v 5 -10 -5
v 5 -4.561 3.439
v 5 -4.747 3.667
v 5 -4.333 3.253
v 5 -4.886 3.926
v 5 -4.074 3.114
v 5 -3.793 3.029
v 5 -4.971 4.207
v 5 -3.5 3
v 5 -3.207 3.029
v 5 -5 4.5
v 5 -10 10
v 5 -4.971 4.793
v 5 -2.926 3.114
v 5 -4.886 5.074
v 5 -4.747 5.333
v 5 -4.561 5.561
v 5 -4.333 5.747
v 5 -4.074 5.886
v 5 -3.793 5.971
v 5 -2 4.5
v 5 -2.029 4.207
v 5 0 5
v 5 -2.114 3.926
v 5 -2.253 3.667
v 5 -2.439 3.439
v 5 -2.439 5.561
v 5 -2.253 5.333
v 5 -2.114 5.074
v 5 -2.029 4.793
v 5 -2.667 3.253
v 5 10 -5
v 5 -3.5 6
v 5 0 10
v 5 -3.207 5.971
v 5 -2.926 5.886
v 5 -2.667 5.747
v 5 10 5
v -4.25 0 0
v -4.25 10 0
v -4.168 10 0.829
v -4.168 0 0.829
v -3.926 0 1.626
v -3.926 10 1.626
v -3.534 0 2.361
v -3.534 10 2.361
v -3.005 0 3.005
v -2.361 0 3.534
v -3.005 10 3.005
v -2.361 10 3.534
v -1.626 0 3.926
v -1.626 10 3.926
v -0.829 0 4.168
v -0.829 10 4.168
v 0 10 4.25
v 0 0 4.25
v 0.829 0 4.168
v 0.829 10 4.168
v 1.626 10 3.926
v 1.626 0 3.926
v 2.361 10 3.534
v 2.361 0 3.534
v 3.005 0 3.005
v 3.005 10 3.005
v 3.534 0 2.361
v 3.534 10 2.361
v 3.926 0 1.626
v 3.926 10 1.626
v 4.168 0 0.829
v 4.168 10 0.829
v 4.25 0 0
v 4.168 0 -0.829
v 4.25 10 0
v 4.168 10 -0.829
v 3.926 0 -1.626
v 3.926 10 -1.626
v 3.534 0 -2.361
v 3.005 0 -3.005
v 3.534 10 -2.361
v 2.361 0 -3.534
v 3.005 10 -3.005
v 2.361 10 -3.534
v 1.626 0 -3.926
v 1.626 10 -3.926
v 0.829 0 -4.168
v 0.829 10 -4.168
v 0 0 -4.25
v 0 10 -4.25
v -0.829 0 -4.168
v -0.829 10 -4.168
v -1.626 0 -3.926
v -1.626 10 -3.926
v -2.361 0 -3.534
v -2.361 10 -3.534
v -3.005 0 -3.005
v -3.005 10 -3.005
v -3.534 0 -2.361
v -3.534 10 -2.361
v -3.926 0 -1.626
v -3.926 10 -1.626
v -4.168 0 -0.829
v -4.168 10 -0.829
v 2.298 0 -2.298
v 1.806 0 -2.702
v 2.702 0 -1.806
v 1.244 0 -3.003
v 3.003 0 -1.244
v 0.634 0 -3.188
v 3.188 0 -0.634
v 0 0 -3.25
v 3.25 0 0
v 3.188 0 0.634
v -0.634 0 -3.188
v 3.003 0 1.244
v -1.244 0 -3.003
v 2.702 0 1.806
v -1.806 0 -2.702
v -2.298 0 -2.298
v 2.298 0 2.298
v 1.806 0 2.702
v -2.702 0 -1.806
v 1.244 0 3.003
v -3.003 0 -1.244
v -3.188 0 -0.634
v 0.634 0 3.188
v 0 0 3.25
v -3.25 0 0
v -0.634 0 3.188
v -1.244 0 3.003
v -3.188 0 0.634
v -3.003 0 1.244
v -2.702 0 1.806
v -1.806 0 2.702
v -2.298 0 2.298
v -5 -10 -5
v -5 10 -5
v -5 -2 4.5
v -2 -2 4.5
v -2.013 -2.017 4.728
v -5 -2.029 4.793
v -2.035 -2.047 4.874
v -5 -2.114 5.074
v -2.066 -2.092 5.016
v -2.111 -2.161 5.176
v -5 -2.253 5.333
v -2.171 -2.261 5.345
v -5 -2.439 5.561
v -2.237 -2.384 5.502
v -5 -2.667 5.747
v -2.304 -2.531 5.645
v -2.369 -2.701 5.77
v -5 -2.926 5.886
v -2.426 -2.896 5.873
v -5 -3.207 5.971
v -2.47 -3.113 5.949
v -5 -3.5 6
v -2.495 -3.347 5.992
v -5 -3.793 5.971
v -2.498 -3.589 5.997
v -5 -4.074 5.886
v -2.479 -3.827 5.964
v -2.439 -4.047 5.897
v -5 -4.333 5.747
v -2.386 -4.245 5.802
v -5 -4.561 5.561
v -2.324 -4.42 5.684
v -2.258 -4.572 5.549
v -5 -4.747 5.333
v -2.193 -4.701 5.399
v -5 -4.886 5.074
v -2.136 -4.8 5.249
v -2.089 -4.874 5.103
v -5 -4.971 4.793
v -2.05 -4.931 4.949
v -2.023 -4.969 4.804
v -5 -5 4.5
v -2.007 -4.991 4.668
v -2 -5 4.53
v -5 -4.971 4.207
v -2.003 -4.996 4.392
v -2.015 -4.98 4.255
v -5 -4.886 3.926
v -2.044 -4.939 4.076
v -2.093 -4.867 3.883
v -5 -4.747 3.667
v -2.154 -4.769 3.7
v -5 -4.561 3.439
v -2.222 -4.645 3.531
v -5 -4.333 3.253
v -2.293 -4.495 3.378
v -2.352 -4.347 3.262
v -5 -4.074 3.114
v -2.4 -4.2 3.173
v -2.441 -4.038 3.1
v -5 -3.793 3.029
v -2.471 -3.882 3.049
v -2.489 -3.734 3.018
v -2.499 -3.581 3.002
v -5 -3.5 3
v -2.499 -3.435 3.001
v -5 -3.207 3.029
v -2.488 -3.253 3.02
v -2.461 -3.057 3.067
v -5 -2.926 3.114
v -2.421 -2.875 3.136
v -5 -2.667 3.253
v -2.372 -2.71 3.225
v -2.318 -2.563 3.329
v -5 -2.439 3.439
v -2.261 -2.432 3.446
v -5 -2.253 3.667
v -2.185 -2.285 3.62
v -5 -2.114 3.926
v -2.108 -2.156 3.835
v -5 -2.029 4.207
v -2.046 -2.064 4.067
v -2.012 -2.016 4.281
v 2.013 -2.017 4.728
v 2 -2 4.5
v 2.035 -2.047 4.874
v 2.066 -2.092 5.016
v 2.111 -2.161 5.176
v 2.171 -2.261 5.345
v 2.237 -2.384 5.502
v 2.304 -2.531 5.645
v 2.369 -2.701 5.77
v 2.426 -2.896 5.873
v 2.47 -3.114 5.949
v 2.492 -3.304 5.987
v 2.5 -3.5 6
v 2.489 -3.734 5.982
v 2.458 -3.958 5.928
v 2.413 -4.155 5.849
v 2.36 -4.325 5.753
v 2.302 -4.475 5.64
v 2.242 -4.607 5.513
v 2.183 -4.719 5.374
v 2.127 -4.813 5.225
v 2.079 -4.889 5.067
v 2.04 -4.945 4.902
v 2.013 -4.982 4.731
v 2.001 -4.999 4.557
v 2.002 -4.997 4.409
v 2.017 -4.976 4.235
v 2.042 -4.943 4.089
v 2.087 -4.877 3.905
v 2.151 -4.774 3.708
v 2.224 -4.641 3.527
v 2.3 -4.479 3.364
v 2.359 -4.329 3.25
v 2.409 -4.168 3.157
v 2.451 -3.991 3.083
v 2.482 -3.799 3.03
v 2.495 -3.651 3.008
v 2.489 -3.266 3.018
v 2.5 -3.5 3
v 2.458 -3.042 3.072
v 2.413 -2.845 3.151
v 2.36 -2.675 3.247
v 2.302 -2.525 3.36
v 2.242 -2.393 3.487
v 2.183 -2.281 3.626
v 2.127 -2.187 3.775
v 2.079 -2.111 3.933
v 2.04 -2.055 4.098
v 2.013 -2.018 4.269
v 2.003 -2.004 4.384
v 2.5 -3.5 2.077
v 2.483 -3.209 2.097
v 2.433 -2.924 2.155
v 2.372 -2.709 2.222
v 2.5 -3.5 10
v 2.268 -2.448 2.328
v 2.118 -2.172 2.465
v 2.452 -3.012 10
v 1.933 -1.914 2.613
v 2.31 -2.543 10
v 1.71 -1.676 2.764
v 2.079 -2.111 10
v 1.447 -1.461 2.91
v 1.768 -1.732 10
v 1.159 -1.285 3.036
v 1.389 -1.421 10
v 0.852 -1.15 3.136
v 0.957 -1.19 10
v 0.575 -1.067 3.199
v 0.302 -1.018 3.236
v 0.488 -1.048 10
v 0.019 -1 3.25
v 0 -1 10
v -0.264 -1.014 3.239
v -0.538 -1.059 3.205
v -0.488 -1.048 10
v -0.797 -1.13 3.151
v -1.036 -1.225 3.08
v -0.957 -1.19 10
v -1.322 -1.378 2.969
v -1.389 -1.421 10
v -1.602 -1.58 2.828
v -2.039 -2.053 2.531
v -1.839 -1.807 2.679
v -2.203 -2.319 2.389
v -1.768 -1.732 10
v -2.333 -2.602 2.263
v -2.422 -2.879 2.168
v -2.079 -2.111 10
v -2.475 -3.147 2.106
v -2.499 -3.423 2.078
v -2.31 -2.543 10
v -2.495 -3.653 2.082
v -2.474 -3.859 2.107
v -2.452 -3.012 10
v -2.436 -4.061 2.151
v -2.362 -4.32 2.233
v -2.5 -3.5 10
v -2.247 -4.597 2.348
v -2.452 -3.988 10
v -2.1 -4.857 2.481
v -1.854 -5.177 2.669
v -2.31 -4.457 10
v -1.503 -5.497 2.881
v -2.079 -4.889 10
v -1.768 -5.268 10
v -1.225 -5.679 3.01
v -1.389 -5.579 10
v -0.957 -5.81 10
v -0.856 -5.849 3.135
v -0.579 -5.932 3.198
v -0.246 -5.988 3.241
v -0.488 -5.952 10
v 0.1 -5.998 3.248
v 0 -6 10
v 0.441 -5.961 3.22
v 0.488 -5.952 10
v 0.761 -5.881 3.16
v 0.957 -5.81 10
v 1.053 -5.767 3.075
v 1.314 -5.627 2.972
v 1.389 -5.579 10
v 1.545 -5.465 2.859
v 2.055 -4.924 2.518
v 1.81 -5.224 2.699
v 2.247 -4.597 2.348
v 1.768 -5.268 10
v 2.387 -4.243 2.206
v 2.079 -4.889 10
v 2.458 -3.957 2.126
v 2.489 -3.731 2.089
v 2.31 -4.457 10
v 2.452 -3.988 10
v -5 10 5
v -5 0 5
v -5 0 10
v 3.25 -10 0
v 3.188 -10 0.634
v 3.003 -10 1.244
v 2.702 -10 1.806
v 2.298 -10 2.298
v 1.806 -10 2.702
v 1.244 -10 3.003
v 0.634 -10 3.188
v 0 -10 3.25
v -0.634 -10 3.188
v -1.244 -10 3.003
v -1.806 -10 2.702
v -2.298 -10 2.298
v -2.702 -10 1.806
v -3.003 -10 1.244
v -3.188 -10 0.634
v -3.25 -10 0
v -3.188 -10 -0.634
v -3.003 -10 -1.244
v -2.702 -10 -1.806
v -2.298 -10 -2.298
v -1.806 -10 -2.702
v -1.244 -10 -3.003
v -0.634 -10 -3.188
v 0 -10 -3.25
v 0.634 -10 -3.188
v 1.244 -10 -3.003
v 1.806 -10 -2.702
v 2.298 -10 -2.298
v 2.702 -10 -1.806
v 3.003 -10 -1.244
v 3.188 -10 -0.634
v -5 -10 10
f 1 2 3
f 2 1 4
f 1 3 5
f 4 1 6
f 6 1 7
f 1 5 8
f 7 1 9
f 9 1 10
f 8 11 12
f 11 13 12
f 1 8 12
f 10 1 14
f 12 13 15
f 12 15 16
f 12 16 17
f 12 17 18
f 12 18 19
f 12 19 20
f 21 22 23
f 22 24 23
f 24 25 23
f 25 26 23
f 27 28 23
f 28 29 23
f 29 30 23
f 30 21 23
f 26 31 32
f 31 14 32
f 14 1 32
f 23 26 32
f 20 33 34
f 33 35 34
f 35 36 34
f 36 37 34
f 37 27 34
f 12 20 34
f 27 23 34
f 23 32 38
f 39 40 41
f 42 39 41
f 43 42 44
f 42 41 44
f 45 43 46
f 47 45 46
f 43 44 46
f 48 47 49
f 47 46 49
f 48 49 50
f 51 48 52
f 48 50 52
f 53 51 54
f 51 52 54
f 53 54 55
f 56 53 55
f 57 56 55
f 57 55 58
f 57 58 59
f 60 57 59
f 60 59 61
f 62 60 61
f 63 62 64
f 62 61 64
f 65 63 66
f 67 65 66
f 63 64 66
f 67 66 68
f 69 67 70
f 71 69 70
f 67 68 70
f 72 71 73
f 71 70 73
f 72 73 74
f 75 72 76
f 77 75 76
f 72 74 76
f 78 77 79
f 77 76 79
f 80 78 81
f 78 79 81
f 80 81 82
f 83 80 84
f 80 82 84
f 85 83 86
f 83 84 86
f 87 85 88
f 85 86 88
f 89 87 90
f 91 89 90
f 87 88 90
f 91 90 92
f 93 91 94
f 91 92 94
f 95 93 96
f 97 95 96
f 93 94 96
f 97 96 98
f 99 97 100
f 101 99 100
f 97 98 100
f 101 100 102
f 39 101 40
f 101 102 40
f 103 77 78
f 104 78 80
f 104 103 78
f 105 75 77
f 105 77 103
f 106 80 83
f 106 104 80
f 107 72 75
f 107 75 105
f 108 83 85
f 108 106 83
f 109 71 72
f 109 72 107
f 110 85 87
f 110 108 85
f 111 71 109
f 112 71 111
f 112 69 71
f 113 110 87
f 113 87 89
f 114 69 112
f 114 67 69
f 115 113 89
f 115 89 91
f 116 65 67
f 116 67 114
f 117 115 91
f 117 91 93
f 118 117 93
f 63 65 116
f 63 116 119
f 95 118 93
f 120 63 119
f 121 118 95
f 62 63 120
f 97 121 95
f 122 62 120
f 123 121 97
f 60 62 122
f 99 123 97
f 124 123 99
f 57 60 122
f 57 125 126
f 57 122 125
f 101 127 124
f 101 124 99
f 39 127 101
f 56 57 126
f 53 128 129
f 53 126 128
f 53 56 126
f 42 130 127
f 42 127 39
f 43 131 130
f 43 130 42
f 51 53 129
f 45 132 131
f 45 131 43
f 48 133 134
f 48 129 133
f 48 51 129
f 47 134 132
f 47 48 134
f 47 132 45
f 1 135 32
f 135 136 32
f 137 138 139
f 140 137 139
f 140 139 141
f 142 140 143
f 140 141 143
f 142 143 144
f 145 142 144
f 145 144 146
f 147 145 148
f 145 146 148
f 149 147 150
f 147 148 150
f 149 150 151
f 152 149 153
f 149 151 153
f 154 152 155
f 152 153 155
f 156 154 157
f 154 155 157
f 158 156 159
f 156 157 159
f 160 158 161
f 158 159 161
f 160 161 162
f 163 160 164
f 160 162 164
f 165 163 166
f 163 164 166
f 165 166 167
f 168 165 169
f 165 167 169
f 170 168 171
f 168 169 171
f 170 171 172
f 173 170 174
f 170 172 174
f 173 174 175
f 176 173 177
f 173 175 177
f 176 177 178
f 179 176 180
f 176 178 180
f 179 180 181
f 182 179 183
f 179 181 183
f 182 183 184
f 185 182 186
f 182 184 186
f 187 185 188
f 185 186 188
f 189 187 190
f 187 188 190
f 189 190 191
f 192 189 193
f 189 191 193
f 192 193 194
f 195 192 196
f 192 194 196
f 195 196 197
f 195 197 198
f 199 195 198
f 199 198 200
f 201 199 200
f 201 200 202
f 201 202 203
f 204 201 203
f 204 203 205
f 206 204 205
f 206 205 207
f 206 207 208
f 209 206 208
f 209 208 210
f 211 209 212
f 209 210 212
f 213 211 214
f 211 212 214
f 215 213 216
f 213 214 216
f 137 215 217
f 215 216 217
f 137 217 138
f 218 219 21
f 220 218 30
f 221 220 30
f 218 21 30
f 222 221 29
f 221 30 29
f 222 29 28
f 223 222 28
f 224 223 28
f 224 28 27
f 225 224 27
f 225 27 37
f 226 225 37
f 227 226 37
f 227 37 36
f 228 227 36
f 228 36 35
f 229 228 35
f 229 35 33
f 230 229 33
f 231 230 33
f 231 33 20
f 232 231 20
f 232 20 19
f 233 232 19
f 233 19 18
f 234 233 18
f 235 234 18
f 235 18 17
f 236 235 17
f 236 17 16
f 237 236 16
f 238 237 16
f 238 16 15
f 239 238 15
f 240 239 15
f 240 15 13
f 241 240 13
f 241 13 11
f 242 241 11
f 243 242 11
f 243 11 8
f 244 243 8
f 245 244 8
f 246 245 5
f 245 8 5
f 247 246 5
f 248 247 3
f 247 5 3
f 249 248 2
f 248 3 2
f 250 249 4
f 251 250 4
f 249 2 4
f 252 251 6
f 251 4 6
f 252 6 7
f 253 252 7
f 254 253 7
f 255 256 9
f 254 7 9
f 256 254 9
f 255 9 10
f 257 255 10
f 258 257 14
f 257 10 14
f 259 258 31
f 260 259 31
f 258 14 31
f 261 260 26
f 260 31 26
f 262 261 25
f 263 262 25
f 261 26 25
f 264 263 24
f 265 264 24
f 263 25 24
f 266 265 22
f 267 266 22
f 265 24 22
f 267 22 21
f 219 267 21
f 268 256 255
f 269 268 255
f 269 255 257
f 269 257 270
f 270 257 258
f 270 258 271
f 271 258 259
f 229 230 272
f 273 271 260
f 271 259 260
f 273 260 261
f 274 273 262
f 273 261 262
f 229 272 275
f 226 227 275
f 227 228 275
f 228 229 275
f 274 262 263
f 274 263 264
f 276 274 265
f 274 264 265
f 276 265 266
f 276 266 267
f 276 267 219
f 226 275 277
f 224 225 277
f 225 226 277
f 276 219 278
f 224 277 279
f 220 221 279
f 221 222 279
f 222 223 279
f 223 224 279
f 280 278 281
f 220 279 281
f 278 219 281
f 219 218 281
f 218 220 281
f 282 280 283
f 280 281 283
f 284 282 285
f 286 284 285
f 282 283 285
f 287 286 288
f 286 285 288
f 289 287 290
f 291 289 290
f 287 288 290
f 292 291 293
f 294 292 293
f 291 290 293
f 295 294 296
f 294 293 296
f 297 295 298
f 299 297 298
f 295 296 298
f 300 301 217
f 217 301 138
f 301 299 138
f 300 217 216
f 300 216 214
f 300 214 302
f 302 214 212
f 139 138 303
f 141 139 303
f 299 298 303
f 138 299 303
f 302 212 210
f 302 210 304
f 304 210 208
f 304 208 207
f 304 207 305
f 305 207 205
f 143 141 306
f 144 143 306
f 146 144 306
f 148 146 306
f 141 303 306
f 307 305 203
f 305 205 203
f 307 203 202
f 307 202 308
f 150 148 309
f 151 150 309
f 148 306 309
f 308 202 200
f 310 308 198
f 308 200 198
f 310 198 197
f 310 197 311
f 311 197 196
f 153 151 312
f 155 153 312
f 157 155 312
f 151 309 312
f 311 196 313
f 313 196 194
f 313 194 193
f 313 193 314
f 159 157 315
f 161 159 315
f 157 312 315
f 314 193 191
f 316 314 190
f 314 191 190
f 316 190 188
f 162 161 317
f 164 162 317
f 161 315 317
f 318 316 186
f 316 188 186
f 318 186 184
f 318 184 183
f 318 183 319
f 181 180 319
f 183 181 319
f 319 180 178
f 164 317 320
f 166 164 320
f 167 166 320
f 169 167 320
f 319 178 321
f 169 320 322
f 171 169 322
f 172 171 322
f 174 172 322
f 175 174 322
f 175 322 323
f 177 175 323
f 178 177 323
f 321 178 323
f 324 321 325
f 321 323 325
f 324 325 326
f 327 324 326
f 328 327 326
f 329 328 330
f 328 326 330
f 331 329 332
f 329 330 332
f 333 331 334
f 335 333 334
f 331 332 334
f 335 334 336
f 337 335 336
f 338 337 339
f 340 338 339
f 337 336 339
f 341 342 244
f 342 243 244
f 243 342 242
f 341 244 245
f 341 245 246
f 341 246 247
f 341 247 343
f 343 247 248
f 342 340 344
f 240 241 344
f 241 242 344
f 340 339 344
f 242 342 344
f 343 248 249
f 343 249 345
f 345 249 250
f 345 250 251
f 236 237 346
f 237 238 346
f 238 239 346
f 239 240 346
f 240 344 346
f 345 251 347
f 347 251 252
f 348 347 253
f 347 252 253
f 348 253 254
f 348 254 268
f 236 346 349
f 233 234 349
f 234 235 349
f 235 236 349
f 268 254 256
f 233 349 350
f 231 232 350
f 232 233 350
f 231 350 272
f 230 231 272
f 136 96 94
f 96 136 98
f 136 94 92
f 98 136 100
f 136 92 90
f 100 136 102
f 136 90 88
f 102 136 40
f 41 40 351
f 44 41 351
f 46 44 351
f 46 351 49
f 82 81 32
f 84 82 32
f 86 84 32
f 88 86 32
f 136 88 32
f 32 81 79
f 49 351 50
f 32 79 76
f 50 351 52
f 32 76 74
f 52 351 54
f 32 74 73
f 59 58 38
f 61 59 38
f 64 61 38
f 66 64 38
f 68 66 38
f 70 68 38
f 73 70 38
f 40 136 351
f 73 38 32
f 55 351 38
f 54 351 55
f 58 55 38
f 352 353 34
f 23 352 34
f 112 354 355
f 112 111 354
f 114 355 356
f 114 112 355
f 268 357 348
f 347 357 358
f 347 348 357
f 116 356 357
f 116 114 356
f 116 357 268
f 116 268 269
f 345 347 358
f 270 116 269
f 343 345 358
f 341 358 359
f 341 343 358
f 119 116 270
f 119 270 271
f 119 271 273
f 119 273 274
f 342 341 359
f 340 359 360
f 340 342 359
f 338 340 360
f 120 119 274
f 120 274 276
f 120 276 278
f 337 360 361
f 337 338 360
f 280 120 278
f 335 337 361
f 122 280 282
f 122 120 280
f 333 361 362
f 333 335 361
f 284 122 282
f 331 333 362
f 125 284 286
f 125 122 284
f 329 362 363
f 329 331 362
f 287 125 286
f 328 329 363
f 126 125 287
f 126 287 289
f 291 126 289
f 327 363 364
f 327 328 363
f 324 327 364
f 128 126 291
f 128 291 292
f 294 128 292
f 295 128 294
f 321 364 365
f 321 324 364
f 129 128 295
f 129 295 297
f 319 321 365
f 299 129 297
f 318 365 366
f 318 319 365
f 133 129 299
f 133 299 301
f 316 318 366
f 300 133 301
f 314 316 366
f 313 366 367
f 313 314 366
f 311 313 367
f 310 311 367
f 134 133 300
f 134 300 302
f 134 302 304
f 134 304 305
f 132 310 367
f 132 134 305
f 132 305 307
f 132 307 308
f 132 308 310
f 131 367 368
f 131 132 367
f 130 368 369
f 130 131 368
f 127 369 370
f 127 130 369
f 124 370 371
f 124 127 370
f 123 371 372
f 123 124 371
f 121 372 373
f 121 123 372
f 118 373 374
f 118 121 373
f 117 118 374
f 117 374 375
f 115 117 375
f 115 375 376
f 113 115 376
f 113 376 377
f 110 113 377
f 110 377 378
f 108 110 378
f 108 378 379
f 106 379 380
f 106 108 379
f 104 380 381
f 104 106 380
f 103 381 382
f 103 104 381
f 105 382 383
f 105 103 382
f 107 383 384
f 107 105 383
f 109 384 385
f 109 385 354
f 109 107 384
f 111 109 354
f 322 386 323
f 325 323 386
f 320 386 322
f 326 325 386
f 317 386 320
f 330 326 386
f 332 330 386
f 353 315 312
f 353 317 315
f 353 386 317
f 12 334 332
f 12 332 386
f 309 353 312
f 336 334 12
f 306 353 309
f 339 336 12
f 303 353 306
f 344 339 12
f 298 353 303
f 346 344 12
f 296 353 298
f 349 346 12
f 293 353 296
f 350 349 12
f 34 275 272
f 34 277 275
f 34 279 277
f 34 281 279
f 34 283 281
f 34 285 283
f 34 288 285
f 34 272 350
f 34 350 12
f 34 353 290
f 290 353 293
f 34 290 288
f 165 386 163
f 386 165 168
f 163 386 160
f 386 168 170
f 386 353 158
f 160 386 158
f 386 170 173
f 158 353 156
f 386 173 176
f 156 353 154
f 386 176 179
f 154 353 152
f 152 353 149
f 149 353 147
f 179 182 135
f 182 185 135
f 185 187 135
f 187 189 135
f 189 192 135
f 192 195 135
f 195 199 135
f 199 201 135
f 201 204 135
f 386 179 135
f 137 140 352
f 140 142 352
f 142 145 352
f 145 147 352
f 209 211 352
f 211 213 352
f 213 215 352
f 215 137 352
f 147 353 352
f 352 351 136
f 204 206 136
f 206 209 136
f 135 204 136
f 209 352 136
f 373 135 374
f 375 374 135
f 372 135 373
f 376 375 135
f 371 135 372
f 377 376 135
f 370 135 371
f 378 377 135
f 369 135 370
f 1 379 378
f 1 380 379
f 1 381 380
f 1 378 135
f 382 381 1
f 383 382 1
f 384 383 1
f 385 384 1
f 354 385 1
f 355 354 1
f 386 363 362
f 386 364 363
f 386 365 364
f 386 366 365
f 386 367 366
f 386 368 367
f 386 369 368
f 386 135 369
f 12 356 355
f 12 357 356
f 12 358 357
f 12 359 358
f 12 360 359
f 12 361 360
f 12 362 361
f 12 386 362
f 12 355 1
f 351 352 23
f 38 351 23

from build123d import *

# Parameters (mm, degrees)
F0_W          = 10
F0_H          = 10
F0_R          = 3.25
F1_DEPTH      = 10
F0_H_2        = 5
F2_DEPTH      = 10
F3_R          = 4.25
F3_R_2        = 3.25
F4_DEPTH      = 10
F5_R          = 1.5
F6_DEPTH      = 5.001
F6_DEPTH_BACK = 5.001
F7_R          = 2.5
F8_DEPTH      = 10


with BuildPart() as f1:
    # F0 (on Front) → F1 (new body)
    with BuildSketch(Plane.XZ):
        Rectangle(F0_W, F0_H)
        Circle(F0_R, mode=Mode.SUBTRACT)
    extrude(amount=-F1_DEPTH)

    # F0 (on Front) → F2 (join)
    with BuildSketch(Plane.XZ):
        with Locations((0, 7.5)):
            Rectangle(F0_W, F0_H_2)
        Rectangle(F0_W, F0_H)
        Circle(F0_R, mode=Mode.SUBTRACT)
    extrude(amount=F2_DEPTH)

    # F3 (on face) → F4 (cut)
    with BuildSketch(Plane(origin=(0, 10, 0), x_dir=(-1, 0, 0), z_dir=(0, 1, 0))):
        Circle(F3_R)
        Circle(F3_R_2, mode=Mode.SUBTRACT)
        Circle(F3_R_2)
    extrude(amount=-F4_DEPTH, mode=Mode.SUBTRACT)

    # F5 (on Right) → F6 (cut, two sides)
    with BuildSketch(Plane.YZ) as f6_sk:
        with Locations((-3.5, 4.5)):
            Circle(F5_R)
    extrude(amount=-F6_DEPTH, mode=Mode.SUBTRACT)
    extrude(f6_sk.sketch, amount=F6_DEPTH_BACK, mode=Mode.SUBTRACT)

    # F7 (on face) → F8 (cut)
    with BuildSketch(Plane.XY.offset(10)):
        with Locations((0, -3.5)):
            Circle(F7_R)
    extrude(amount=-F8_DEPTH, mode=Mode.SUBTRACT)


solid = f1.part
